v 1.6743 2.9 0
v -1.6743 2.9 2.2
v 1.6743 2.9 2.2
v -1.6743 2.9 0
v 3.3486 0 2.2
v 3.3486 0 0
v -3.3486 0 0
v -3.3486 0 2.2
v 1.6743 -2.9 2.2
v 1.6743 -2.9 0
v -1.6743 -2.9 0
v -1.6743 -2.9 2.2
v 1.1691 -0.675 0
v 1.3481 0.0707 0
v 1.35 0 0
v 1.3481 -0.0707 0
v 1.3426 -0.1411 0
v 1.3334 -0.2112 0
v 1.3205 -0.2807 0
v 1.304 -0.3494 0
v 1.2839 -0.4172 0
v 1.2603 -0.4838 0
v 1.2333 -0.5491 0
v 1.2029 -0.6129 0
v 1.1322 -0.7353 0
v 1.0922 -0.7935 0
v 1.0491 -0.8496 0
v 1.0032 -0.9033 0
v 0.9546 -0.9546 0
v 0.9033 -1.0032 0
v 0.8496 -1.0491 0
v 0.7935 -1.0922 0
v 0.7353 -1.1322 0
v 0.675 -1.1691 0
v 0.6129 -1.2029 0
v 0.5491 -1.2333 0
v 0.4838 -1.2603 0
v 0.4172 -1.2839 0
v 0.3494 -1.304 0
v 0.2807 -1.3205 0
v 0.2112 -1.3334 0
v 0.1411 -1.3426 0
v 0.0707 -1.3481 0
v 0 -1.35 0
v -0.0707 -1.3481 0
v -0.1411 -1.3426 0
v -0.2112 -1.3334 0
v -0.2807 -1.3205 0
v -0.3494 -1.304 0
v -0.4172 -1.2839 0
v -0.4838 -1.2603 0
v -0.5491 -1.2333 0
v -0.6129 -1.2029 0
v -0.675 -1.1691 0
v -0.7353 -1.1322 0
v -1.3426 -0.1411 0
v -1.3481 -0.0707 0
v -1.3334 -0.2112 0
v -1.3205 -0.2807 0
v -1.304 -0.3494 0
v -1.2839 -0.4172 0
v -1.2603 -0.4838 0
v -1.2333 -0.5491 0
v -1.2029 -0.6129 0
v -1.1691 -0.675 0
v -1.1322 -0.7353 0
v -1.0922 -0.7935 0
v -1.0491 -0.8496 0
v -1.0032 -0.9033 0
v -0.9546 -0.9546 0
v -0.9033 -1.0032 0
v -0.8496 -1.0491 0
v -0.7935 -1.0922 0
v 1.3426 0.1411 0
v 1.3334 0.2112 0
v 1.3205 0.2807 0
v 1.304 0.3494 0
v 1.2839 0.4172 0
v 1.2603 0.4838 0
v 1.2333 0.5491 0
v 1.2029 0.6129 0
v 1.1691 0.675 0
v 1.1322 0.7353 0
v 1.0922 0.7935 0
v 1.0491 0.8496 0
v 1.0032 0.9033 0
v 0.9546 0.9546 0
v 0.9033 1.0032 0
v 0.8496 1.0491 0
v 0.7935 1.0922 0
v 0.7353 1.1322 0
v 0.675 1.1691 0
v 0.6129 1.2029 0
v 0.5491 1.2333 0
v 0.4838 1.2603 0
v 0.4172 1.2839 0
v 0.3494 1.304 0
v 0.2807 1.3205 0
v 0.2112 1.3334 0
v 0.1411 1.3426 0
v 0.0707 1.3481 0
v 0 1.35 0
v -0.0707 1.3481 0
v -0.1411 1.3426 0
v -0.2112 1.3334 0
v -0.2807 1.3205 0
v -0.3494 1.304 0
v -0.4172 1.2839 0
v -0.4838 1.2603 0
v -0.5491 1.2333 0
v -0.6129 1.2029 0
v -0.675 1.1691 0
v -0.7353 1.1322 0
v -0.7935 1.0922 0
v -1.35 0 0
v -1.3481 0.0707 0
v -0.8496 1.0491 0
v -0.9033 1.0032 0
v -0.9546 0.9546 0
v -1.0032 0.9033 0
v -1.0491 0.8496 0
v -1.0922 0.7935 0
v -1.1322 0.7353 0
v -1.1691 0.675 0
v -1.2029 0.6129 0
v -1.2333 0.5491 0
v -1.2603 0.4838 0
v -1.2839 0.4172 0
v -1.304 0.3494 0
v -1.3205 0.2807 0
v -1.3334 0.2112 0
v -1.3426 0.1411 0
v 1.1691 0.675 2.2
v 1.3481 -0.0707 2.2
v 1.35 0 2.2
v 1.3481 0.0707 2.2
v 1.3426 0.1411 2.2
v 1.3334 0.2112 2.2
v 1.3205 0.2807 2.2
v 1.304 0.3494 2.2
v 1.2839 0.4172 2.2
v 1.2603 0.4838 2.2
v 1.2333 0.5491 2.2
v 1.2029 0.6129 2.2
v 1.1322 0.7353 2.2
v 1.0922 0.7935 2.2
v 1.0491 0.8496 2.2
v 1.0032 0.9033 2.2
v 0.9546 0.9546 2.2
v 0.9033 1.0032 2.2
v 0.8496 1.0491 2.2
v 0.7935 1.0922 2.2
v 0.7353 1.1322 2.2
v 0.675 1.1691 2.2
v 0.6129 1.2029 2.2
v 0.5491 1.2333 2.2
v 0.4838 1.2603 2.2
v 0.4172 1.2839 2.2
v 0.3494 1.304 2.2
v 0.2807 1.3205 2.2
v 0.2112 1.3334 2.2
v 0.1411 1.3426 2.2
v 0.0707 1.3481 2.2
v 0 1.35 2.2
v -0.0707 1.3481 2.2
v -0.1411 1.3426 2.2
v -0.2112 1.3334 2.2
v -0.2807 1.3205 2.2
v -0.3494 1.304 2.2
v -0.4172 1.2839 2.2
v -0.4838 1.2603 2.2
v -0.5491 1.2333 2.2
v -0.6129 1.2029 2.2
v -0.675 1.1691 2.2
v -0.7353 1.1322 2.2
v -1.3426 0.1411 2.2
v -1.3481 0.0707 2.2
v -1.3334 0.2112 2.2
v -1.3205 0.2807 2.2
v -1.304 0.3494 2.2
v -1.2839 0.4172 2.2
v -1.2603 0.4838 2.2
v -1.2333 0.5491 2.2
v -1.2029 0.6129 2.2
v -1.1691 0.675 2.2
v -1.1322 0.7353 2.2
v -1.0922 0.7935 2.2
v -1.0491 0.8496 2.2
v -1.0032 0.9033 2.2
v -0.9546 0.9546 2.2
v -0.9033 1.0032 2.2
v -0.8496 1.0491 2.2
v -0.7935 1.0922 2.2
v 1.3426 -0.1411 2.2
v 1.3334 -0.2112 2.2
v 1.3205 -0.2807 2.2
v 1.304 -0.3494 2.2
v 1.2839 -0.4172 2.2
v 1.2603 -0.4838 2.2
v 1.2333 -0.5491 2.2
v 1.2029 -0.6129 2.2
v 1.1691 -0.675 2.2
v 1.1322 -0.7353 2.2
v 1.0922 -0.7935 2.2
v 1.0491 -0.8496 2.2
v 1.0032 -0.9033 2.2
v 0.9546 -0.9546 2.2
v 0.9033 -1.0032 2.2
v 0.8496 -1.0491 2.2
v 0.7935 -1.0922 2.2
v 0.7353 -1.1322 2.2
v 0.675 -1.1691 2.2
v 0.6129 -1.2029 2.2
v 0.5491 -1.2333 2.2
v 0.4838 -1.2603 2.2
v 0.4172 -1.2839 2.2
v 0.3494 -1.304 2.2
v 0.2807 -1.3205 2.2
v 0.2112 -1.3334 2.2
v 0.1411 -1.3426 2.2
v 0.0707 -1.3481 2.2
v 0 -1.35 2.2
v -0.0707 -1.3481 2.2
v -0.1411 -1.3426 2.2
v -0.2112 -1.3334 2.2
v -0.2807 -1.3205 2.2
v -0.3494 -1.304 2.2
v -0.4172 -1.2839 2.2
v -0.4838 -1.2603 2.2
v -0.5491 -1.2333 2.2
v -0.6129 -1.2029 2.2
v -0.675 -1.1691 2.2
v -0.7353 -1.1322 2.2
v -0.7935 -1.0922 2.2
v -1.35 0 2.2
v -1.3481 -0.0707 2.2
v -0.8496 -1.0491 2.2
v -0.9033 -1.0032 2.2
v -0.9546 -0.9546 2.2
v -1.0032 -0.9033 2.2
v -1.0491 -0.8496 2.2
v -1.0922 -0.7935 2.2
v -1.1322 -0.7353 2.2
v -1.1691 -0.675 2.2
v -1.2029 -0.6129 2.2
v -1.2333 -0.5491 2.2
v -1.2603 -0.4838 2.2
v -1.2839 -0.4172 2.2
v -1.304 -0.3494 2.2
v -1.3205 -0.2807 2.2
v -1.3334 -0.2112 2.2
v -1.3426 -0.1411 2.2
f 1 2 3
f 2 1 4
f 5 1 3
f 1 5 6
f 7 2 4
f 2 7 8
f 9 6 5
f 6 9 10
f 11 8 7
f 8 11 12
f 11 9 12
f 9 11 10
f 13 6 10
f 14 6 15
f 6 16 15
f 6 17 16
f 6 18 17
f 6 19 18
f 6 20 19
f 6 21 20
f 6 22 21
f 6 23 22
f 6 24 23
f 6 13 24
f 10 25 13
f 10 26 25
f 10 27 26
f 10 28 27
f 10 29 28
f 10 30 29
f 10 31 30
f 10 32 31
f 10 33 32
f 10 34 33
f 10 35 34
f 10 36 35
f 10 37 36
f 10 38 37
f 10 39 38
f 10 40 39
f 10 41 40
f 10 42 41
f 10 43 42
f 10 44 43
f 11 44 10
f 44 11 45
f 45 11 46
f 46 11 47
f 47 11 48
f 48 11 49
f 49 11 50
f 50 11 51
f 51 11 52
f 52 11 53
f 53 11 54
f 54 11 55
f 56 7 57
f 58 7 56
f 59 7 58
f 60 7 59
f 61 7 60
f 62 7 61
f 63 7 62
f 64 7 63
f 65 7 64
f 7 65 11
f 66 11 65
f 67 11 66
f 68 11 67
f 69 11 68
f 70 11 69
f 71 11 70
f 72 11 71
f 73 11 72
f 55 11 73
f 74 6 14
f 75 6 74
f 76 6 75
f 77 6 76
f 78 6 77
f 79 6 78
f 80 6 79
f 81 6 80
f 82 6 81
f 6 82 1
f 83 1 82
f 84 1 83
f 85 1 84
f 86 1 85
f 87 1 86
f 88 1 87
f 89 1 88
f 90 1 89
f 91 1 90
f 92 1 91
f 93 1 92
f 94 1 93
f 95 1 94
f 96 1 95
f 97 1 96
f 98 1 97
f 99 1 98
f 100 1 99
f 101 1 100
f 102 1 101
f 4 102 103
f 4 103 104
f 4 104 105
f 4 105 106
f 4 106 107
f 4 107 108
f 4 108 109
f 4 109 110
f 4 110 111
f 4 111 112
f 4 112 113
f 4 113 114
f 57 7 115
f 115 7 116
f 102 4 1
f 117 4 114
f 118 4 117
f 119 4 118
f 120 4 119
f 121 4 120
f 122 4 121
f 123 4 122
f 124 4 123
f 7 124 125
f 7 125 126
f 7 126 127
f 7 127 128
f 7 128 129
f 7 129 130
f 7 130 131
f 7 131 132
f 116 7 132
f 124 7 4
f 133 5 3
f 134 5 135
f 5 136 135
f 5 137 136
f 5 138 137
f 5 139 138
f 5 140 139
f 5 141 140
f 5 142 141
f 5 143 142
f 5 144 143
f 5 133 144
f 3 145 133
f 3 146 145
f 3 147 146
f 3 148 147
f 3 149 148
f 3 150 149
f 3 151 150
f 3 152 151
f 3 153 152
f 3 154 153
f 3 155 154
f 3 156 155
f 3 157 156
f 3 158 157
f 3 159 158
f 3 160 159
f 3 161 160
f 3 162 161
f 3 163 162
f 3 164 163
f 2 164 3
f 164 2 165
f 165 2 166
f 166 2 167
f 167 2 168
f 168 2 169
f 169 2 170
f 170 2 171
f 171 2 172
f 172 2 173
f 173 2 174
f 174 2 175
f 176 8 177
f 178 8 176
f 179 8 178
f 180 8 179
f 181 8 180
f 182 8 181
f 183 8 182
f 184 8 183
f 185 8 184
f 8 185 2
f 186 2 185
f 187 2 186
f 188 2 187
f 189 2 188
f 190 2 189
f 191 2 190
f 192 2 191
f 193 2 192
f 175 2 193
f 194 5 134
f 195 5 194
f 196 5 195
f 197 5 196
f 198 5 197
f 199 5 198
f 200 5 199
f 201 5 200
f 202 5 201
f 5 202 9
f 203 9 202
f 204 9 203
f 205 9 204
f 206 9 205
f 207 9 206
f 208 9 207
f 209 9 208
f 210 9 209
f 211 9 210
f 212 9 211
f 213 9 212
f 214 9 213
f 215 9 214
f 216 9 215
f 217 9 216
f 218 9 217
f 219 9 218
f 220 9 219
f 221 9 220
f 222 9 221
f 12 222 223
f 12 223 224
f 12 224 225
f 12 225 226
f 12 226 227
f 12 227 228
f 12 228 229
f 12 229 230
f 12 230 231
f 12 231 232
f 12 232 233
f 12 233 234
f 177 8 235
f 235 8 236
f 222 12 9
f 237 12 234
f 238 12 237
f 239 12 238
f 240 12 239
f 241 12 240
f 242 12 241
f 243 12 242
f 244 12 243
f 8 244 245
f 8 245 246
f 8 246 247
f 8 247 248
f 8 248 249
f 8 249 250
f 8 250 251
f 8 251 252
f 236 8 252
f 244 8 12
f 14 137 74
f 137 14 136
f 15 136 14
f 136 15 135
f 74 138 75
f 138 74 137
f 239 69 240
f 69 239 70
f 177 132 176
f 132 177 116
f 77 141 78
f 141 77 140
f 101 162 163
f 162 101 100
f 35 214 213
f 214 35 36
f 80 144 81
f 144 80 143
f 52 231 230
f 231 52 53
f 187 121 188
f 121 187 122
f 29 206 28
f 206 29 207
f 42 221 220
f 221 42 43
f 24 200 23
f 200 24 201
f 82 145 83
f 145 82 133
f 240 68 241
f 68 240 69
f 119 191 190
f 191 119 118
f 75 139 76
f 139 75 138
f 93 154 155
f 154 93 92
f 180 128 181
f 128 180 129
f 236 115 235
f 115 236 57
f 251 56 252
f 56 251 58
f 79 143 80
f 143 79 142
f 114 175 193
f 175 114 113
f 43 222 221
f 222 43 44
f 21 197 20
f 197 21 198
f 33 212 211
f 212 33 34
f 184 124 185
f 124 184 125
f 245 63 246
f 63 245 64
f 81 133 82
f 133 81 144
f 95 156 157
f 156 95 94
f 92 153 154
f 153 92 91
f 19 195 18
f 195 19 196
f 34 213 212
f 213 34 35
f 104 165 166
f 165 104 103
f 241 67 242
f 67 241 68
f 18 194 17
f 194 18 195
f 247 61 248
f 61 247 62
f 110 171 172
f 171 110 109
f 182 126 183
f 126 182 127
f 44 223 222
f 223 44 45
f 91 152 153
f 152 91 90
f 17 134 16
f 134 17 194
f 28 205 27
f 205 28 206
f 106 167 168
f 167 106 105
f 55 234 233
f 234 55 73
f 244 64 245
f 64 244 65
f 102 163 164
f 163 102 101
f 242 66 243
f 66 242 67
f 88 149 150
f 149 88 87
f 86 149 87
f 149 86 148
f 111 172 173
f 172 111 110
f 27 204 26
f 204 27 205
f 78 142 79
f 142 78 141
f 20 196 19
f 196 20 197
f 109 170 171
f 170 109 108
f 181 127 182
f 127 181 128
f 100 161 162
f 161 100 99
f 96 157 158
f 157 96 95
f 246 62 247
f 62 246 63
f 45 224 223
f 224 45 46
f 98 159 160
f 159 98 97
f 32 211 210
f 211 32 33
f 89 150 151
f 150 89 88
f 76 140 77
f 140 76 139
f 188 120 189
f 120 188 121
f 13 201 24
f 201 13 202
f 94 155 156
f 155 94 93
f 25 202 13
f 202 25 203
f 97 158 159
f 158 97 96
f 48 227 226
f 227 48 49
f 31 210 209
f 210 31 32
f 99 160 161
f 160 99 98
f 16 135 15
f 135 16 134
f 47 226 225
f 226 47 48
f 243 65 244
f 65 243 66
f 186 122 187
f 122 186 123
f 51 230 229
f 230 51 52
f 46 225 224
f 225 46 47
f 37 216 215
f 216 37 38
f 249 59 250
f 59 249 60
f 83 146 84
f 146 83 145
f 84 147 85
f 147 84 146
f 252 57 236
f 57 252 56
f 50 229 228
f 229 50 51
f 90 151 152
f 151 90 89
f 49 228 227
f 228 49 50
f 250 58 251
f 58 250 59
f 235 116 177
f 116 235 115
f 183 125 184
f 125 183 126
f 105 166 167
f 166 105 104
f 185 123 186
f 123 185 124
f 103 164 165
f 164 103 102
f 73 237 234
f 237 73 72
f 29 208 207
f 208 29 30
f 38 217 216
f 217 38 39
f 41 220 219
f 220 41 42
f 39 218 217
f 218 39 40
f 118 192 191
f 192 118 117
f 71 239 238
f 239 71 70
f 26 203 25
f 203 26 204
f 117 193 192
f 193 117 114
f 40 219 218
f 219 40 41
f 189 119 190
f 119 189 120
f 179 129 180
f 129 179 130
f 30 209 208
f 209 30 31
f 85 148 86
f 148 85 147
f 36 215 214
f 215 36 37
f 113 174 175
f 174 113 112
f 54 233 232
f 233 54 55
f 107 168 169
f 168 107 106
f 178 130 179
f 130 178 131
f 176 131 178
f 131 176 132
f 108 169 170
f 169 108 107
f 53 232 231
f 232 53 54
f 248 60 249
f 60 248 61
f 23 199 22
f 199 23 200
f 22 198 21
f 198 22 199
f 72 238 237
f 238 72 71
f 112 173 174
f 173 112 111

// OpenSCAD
$fn = 120;

across_flats = 5.8;   // mm
thickness    = 2.2;   // mm
screw_d      = 2.5;   // mm

// Typical clearance for M2.5 nut hole (approx). Adjust if needed.
hole_d = 2.7;         // mm

module hex_prism_af(af, h){
    // For a regular hexagon: across_flats = 2 * apothem
    // Circumradius R = af / sqrt(3)
    R = af / sqrt(3);
    linear_extrude(height=h)
        polygon([ for(i=[0:5]) [ R*cos(60*i), R*sin(60*i) ] ]);
}

difference(){
    hex_prism_af(across_flats, thickness);
    translate([0,0,-0.2])
        cylinder(d=hole_d, h=thickness+0.4);
}
